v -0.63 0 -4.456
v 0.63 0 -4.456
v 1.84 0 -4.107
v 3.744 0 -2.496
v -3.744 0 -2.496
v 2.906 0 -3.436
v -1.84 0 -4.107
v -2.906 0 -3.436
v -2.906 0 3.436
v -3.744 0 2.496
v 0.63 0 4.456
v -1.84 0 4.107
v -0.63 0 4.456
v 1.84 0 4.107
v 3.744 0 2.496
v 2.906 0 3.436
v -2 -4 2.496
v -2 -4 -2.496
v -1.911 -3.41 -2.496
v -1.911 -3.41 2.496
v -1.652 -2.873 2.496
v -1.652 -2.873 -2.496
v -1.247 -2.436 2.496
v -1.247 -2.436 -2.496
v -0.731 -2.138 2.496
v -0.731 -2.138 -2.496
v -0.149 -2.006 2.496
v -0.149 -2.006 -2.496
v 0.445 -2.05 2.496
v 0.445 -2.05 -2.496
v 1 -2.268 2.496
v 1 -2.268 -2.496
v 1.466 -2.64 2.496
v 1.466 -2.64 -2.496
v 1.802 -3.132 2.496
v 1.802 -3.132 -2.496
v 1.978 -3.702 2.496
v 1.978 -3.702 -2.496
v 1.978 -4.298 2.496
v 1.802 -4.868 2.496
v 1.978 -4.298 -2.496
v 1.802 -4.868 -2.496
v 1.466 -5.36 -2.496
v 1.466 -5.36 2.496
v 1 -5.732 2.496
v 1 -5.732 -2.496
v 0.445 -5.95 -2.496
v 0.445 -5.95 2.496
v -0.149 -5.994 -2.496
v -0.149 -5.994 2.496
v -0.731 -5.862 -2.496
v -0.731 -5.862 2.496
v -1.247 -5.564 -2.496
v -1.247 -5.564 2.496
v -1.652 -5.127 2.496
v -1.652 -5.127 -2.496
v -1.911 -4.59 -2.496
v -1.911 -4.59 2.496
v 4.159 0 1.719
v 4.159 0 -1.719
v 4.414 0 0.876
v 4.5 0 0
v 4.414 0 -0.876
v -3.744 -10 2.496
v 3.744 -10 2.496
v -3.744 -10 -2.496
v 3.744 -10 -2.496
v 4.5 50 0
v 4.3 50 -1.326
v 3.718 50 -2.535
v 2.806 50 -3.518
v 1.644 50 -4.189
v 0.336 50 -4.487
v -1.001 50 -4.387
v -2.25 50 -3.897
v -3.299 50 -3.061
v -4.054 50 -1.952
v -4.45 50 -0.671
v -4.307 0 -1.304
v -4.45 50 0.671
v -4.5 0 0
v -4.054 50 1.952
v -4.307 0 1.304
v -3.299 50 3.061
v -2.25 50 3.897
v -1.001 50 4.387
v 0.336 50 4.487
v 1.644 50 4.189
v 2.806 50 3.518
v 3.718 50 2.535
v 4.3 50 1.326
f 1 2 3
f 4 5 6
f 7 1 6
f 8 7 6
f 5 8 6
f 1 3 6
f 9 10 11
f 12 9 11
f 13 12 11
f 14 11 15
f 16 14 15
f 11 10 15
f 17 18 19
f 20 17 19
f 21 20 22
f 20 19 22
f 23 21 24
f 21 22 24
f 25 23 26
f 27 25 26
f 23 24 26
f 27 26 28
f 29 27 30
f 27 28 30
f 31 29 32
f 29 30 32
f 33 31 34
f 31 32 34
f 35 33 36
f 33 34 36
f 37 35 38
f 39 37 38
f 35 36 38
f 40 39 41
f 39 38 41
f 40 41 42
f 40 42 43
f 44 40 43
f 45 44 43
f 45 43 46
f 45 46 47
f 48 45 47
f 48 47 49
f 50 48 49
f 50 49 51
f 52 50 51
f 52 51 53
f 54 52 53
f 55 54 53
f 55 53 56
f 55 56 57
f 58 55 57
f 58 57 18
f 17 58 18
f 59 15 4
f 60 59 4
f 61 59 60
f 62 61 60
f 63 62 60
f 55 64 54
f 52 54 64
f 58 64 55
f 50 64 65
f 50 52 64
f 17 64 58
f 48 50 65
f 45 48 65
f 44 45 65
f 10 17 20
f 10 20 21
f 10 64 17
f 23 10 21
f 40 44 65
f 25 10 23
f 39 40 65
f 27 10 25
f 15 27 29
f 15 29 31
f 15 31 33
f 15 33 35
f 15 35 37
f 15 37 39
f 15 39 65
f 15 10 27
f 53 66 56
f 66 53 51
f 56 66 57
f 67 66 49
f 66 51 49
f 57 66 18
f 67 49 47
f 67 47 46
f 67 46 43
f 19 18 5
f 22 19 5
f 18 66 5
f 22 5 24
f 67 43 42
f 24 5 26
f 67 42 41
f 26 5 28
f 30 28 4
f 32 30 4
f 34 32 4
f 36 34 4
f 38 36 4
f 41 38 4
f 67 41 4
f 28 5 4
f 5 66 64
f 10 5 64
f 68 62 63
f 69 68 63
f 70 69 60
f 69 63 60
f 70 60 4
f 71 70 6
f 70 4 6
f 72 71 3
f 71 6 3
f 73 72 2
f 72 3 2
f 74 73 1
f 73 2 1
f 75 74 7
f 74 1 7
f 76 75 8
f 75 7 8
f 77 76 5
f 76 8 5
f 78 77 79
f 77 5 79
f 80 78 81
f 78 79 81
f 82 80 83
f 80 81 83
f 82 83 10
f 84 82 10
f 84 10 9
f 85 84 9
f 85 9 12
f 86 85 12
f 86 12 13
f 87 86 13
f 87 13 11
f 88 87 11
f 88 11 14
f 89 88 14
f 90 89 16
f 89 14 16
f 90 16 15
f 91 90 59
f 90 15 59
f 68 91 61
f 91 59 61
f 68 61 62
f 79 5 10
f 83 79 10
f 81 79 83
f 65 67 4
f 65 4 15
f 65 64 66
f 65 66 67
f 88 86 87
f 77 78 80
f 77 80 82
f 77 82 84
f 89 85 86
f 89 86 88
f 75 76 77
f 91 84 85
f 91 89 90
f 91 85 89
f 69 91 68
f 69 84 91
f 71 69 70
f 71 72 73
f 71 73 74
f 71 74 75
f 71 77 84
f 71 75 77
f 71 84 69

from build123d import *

# Parameters (mm, degrees)
SKETCH1_R           = 4.5
BOSS_EXTRUDE1_DEPTH = 50
SKETCH2_W           = 7.48845263
SKETCH2_H           = 4.992301796
BOSS_EXTRUDE2_DEPTH = 10
SKETCH3_R           = 2
CUT_EXTRUDE1_DEPTH  = 10


with BuildPart() as part:
    # Sketch1 → Boss-Extrude1 (new body)
    with BuildSketch(Plane(origin=(0, 0, 0), x_dir=(1, 0, 0), z_dir=(0, 1, 0))):
        Circle(SKETCH1_R)
    extrude(amount=BOSS_EXTRUDE1_DEPTH)

    # Sketch2 → Boss-Extrude2 (add)
    with BuildSketch(Plane.XZ):
        Rectangle(SKETCH2_W, SKETCH2_H)
    extrude(amount=BOSS_EXTRUDE2_DEPTH)

    # Sketch3 → Cut-Extrude1 (cut)
    with BuildSketch(Plane(origin=(0, 0, -2.496150898), x_dir=(-1, 0, 0), z_dir=(0, 0, -1))):
        with Locations((0, -4)):
            Circle(SKETCH3_R)
    extrude(amount=-CUT_EXTRUDE1_DEPTH, mode=Mode.SUBTRACT)


solid = part.part
